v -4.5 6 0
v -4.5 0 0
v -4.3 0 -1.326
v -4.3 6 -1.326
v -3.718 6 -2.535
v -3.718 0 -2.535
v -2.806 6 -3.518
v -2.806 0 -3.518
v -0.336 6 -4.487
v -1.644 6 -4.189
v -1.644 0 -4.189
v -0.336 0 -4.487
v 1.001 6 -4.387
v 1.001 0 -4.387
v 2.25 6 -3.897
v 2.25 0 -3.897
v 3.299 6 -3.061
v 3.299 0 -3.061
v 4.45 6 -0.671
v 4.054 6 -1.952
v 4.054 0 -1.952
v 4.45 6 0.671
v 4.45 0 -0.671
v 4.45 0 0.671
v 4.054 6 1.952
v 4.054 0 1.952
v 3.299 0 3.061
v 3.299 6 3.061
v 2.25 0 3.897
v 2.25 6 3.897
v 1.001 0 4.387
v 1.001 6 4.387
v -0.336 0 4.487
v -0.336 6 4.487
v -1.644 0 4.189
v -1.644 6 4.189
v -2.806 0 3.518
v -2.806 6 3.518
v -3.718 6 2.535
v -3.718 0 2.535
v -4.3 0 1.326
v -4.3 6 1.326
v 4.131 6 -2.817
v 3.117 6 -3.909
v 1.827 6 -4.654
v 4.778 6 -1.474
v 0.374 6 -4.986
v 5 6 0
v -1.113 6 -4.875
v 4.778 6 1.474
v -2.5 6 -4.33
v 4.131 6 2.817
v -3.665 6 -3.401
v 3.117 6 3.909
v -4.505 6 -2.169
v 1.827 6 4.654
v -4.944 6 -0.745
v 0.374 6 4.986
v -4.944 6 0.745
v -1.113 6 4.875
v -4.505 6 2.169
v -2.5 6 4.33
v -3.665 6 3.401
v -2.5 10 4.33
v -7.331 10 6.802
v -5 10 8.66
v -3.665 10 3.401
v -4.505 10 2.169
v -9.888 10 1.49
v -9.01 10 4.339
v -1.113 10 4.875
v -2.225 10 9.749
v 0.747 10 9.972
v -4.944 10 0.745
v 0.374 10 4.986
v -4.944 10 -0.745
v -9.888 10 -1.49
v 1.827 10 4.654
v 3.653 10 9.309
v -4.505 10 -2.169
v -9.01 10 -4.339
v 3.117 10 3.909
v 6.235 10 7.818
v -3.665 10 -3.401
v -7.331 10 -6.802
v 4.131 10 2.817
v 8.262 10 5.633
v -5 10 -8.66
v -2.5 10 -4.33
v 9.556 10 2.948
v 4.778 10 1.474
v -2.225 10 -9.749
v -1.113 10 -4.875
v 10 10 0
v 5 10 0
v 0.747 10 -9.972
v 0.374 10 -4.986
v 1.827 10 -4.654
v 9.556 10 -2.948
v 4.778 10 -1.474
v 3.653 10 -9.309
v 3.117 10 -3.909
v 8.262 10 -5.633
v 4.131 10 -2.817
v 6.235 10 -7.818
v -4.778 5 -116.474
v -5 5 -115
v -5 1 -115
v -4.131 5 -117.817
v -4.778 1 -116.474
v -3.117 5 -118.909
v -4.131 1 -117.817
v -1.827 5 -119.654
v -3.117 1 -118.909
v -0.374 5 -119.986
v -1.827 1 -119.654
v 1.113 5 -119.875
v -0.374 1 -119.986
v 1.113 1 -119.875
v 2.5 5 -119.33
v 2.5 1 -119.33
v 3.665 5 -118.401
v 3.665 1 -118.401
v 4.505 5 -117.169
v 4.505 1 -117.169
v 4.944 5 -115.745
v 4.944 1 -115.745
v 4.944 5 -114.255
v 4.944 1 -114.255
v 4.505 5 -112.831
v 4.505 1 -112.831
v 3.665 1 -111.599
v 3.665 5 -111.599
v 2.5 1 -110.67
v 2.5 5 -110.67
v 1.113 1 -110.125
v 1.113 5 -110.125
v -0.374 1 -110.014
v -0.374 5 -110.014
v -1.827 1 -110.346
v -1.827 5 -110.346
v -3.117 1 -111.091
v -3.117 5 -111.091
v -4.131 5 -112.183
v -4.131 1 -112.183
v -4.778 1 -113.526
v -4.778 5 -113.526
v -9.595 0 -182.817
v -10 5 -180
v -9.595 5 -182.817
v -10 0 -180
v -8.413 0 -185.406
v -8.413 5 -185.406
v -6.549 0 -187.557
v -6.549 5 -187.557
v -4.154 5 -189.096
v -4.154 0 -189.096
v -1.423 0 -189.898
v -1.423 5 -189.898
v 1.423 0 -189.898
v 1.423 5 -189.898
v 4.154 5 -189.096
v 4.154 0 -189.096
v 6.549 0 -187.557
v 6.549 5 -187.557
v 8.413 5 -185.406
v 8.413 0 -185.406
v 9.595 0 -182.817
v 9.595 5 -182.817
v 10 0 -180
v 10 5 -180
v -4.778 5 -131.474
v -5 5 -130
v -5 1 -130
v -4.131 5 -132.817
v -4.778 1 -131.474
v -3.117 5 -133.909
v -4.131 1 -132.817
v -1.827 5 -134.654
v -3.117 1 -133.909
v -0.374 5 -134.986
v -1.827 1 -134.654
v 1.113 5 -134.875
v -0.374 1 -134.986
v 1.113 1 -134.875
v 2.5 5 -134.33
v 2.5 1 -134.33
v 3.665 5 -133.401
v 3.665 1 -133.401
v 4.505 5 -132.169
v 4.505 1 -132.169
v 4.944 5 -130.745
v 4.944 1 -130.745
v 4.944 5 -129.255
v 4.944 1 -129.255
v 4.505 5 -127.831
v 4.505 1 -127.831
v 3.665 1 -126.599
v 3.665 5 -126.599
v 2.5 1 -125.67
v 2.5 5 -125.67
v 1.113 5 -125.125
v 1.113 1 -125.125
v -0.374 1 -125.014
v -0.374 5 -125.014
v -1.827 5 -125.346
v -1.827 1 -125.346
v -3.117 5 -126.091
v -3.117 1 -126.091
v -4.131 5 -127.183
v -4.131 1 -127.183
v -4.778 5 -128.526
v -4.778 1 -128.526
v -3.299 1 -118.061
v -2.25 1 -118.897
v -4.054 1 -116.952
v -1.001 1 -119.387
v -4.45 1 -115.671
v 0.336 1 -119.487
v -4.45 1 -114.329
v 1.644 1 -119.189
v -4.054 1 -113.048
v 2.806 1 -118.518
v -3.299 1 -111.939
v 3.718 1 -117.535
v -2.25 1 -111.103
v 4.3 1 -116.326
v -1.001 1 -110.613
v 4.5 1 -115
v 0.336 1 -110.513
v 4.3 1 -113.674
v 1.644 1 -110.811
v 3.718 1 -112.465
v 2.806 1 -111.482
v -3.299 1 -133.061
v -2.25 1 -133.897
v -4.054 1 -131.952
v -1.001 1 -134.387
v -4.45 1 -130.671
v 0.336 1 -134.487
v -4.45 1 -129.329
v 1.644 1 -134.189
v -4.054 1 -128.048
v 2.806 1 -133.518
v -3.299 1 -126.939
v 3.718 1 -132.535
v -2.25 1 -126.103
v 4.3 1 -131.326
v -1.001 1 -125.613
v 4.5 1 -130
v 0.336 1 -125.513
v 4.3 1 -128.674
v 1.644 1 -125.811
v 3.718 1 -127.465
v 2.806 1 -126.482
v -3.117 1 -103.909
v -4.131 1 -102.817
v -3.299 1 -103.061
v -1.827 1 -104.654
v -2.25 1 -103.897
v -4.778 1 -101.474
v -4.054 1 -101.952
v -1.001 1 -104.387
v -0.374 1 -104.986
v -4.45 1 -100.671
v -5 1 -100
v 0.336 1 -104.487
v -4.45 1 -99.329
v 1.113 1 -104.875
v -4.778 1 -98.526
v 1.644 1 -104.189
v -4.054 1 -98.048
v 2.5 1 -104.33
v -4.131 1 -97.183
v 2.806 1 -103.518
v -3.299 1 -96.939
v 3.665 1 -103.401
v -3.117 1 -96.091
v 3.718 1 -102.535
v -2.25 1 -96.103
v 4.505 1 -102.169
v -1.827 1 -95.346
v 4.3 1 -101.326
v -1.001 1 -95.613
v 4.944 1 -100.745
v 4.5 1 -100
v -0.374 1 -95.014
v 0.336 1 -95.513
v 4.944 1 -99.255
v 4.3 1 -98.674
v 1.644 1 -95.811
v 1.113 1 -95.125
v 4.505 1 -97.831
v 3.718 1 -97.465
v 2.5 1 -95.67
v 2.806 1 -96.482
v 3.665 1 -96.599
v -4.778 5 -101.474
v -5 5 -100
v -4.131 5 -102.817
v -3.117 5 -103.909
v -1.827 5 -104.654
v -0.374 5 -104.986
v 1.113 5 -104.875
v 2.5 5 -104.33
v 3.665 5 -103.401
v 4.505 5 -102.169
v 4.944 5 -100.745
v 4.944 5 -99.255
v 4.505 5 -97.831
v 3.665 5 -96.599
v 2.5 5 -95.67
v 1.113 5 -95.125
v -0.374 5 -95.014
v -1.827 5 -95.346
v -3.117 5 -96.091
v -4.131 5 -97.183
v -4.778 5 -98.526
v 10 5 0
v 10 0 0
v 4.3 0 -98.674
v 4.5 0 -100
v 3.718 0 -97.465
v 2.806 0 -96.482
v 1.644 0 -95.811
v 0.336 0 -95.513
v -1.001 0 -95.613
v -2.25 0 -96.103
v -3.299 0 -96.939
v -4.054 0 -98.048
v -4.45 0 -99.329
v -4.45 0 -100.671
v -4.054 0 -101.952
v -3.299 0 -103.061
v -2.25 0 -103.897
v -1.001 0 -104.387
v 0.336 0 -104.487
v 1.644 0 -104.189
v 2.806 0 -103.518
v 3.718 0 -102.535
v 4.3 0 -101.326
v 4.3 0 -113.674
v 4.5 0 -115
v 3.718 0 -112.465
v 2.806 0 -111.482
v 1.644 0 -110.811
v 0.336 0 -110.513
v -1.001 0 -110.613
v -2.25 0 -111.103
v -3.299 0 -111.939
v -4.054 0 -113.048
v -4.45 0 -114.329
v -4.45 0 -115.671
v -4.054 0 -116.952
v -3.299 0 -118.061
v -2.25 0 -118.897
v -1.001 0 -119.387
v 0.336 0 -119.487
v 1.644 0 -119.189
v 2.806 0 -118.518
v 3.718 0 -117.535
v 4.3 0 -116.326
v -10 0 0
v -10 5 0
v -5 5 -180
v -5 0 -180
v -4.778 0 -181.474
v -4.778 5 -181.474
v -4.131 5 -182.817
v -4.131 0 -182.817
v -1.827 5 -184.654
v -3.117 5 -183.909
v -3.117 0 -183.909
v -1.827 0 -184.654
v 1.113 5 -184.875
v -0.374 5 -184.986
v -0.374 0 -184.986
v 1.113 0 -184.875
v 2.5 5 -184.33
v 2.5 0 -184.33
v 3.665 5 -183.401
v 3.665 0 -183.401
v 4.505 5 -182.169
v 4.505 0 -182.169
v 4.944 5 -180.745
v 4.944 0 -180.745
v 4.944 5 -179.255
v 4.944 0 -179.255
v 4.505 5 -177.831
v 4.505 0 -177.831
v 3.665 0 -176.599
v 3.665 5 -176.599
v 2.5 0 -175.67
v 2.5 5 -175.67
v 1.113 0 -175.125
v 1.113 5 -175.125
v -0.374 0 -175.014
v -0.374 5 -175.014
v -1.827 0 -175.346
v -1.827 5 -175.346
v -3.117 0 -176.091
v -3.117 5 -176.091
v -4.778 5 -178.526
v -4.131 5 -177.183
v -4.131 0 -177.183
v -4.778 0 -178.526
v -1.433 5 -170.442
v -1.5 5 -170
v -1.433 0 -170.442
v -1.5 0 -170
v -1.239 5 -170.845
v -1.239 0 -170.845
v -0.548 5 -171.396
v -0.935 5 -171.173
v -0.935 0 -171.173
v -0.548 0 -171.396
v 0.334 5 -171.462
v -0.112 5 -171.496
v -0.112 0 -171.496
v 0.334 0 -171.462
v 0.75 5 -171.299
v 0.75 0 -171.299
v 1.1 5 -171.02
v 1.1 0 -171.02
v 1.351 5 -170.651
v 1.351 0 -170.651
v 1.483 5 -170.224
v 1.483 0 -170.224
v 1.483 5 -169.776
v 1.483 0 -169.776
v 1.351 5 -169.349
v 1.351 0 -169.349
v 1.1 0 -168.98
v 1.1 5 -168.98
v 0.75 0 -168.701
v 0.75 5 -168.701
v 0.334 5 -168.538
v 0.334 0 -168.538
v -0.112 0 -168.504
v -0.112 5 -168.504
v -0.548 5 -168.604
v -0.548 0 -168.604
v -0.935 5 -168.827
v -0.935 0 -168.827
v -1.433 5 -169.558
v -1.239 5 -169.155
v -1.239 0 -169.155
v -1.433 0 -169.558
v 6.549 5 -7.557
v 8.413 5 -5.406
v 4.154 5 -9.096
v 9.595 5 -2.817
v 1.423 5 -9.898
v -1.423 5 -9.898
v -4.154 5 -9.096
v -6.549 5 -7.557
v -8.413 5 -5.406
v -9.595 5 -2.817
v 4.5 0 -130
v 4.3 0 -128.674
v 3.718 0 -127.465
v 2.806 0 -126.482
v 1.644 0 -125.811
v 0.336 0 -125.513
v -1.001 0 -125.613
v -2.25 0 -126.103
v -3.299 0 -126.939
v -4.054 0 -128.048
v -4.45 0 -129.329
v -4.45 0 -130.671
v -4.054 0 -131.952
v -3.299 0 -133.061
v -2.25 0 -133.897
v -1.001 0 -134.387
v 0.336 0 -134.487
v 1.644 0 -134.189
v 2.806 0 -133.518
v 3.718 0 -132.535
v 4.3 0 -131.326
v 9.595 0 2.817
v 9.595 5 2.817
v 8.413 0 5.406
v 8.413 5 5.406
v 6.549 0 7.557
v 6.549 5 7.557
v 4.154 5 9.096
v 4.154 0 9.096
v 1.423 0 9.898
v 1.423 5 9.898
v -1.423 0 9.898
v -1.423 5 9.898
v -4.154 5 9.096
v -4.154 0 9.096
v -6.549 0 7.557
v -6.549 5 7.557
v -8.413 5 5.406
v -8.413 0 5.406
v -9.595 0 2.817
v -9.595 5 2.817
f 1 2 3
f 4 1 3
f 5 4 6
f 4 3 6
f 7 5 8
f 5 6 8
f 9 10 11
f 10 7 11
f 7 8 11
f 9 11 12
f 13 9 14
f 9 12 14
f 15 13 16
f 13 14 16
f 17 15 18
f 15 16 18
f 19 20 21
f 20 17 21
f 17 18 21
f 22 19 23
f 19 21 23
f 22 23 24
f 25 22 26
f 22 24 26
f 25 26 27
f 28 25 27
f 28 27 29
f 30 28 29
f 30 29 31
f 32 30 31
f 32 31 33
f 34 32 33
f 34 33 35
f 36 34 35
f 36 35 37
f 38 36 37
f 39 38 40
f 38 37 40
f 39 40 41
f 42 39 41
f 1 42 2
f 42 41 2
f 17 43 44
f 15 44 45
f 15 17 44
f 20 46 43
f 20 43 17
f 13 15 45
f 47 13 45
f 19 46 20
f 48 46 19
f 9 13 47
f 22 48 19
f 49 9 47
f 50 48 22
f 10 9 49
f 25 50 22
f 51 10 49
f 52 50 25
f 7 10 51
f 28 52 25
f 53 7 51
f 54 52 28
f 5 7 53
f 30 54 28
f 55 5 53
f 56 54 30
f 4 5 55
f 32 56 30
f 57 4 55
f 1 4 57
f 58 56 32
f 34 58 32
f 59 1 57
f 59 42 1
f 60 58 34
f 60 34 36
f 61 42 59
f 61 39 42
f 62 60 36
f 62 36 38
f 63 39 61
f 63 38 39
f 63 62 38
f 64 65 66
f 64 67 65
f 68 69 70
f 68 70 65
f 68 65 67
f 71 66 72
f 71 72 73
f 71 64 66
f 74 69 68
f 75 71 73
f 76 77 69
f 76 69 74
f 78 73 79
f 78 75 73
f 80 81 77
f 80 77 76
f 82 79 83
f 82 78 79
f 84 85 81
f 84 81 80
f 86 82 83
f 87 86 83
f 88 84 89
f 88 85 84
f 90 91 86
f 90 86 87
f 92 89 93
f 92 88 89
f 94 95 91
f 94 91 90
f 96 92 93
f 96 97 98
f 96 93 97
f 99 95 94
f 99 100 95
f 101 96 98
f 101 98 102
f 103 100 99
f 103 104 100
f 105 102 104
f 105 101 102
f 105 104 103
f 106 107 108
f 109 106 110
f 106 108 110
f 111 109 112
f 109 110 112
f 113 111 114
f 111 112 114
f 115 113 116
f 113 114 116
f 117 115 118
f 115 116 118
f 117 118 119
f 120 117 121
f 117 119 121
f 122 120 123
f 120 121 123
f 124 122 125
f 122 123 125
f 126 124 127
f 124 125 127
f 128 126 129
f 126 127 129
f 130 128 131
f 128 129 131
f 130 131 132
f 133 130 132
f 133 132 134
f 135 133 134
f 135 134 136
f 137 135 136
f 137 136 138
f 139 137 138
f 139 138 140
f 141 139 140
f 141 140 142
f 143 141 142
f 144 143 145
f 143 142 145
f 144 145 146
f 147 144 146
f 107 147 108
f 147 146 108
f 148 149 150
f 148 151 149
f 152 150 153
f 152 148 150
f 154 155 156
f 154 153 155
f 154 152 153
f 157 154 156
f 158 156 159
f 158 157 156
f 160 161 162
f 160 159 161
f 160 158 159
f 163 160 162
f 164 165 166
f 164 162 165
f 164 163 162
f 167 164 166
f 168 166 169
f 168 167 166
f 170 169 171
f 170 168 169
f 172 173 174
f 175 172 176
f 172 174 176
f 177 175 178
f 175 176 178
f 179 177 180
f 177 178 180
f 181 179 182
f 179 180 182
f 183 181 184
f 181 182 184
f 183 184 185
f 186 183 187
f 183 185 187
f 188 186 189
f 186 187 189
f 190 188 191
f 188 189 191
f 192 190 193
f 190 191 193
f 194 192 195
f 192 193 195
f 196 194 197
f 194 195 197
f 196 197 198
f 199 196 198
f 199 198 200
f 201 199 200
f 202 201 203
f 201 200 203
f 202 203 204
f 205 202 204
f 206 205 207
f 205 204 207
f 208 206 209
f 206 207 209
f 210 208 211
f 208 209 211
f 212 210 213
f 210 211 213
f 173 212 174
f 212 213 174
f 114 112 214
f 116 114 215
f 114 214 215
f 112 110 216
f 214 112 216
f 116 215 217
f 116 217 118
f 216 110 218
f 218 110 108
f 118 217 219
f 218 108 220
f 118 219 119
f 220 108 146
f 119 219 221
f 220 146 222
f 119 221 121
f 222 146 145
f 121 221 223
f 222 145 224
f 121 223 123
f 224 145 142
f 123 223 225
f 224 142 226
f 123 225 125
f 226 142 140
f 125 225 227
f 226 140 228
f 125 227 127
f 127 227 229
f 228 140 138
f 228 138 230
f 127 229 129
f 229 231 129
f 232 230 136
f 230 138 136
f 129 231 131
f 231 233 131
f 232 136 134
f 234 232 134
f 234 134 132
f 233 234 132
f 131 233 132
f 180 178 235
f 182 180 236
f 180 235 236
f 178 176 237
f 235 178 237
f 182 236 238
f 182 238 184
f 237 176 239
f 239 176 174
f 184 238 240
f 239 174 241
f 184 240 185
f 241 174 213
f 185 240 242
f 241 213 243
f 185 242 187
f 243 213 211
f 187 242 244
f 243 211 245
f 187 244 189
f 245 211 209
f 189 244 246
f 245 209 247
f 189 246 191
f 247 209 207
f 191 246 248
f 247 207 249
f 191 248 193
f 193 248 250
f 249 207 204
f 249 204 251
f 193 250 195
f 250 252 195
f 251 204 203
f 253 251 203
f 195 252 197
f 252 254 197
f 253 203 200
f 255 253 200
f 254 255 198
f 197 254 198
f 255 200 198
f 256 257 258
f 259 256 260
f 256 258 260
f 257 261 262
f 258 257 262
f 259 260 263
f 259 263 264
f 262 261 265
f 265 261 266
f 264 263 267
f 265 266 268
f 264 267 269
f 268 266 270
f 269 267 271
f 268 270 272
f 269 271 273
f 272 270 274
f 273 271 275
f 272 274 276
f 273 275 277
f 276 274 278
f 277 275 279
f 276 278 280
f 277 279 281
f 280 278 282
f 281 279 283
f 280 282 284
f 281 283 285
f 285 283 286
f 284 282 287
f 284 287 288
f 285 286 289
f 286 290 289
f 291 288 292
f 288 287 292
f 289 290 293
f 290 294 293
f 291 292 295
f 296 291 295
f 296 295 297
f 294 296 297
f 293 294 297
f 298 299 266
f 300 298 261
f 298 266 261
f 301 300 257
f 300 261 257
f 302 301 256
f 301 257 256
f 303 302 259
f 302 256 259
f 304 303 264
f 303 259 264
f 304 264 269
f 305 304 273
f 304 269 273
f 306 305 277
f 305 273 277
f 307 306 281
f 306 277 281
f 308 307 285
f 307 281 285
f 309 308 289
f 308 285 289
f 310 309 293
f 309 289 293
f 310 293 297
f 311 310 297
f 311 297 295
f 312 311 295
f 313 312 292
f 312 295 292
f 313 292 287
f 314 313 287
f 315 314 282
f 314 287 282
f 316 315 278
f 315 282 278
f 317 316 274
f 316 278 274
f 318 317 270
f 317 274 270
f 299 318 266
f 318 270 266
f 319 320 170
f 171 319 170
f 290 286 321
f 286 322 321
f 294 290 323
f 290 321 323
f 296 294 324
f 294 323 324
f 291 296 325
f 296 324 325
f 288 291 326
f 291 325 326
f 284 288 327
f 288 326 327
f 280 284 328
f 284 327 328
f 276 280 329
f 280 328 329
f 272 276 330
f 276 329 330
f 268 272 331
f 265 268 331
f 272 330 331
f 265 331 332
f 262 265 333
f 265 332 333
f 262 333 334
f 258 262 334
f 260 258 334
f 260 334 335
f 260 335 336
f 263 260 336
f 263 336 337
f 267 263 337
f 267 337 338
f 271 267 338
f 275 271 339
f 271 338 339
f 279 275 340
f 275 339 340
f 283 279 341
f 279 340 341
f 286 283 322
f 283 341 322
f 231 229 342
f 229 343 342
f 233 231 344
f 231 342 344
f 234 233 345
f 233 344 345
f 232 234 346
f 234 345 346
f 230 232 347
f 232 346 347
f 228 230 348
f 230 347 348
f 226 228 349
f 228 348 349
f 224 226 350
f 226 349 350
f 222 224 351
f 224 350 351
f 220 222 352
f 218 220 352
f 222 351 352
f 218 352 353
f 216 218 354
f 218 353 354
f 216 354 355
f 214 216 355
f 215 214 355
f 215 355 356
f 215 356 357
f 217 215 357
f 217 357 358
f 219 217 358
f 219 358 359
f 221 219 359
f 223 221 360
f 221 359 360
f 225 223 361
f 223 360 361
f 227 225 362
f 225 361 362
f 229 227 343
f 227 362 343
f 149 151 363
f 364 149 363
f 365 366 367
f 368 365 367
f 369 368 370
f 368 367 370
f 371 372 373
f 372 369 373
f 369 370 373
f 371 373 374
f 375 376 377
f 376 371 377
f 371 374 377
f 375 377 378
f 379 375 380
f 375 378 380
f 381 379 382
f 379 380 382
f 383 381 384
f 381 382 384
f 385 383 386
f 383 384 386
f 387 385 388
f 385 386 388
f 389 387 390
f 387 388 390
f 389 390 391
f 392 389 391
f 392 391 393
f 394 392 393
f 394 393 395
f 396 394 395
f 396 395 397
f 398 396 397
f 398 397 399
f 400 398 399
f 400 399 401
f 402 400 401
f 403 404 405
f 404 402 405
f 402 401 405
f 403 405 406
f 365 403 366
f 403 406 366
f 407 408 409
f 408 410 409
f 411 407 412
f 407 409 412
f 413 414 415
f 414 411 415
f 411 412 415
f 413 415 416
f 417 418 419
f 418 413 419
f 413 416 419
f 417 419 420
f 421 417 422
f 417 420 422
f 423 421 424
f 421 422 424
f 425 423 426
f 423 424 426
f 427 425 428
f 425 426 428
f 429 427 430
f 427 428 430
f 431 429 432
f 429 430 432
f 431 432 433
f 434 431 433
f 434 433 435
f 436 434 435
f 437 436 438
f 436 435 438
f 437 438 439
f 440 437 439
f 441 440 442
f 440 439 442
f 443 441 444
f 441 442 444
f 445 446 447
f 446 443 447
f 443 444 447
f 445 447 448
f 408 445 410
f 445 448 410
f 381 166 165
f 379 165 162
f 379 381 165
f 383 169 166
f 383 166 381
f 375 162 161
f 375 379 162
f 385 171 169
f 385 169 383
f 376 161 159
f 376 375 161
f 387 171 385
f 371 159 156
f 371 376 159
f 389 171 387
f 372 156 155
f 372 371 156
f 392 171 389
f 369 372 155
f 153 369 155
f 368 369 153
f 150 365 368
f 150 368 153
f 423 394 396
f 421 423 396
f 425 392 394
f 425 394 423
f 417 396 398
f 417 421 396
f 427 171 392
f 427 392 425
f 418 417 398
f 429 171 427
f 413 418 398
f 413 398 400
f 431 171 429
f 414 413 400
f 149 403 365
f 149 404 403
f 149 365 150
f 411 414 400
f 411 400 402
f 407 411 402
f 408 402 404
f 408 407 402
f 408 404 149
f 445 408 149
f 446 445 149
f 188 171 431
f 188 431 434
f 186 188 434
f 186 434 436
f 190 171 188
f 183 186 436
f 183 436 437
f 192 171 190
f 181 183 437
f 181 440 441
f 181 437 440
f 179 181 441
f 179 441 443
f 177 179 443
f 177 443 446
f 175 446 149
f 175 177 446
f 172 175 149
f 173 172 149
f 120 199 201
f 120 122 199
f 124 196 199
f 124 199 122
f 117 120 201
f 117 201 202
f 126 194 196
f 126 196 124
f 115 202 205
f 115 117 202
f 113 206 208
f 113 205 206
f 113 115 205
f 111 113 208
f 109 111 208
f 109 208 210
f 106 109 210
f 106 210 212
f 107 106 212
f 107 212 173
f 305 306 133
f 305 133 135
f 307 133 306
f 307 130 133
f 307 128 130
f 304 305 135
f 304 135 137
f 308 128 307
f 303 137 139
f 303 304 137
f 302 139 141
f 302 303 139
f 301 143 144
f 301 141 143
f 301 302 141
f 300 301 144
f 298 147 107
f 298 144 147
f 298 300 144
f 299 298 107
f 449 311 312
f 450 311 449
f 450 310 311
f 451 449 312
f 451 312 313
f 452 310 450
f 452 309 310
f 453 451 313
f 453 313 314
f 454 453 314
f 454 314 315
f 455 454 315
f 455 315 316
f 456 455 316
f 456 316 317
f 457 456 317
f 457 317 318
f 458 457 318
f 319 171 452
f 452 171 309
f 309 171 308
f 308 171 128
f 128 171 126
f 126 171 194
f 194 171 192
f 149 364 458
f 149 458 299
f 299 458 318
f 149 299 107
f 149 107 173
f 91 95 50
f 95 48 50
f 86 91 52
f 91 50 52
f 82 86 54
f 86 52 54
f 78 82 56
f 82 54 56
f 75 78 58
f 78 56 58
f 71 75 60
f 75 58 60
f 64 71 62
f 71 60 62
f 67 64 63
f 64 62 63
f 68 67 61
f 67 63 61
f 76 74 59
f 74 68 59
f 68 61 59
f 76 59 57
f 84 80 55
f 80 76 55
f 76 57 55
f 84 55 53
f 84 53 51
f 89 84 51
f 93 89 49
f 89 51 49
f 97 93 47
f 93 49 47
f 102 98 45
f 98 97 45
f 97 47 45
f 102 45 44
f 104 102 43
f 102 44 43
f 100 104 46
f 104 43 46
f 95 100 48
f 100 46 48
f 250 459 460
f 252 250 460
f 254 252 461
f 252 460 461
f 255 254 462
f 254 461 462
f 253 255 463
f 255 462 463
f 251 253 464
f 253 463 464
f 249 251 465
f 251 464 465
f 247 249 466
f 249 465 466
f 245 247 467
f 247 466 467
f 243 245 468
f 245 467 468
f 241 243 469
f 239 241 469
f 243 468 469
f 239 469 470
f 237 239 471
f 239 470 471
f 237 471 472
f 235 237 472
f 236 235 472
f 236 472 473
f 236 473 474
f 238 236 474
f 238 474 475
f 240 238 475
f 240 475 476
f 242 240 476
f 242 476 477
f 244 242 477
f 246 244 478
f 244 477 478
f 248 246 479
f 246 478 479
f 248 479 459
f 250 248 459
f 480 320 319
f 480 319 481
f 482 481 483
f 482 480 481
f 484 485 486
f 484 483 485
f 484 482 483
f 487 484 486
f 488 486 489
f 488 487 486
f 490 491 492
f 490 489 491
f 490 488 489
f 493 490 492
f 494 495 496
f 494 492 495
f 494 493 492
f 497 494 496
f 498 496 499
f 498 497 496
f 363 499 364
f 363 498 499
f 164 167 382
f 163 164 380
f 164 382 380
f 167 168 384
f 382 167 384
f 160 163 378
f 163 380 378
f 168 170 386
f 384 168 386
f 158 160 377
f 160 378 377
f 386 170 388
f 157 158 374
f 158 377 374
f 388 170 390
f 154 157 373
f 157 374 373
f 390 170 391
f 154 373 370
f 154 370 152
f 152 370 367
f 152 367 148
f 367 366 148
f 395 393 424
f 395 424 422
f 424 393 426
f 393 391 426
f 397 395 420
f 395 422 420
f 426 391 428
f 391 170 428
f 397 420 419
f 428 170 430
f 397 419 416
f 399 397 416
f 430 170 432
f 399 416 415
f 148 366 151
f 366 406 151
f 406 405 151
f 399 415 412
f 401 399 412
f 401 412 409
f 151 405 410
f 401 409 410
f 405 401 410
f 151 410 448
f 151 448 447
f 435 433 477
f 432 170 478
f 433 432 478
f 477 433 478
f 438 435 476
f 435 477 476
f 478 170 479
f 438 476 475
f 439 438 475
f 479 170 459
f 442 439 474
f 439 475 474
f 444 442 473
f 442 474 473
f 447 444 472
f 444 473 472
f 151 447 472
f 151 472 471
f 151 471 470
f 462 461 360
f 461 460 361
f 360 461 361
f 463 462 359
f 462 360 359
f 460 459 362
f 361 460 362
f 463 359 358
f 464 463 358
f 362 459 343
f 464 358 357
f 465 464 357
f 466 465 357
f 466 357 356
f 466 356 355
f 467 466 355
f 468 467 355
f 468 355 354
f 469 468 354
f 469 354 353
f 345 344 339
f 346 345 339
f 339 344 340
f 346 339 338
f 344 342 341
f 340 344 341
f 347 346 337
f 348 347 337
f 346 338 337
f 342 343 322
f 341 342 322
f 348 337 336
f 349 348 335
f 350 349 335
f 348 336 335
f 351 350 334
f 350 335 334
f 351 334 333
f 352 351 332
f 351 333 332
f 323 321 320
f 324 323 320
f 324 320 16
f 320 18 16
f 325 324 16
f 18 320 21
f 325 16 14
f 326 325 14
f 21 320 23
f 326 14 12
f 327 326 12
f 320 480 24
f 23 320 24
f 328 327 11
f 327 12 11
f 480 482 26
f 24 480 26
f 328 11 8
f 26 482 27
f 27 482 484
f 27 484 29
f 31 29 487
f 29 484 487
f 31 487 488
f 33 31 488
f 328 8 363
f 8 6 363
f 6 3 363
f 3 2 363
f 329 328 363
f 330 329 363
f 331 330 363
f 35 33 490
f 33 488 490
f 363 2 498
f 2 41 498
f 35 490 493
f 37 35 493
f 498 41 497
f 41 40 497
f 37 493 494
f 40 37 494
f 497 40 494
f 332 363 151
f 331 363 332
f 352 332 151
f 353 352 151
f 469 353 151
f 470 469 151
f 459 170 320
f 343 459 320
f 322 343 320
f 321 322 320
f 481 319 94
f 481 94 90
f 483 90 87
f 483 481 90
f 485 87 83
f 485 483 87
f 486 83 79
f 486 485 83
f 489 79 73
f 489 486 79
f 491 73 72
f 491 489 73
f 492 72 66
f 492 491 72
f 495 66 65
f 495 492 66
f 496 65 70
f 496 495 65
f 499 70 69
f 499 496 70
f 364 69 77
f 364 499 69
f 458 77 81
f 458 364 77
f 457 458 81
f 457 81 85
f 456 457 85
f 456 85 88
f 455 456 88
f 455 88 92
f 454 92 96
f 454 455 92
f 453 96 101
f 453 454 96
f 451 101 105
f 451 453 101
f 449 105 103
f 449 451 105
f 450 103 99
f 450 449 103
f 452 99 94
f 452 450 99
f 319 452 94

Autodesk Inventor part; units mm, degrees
ref_plane "YZ Plane" through (0, 0, 0) normal (1, 0, 0) x (0, 1, 0)
ref_plane "XZ Plane" through (0, 0, 0) normal (0, 1, 0) x (-1, 0, 0)
ref_plane "XY Plane" through (0, 0, 0) normal (0, 0, 1) x (1, 0, 0)
sketch "Skizze3" plane through (0, 0, 0) normal (0, 1, 0) x (-1, 0, 0)
  line L0 (0, 0) -> (0, -180) construction
  line L1 (-10, 0) -> (-10, -180)
  line L2 (10, -180) -> (10, 0)
  arc A0 (10, 0) -> (-10, 0) centre (0, 0) ccw
  arc A1 (-10, -180) -> (10, -180) centre (0, -180) ccw
  circle A2 centre (0, 0) radius 5
  circle A3 centre (0, -180) radius 5
  circle A4 centre (0, -170) radius 1.5
  circle A5 centre (0, -130) radius 5
  circle A6 centre (0, -115) radius 5
  circle A7 centre (0, -100) radius 5
  circle A8 centre (0, 0) radius 4.5
  point P0 (0, -90)
  dimension "d4" = 180
  dimension "d5" = 10
  dimension "d6" = 10
  dimension "d7" = 10
  dimension "d8" = 3
  dimension "d9" = 10
  dimension "d10" = 50
  dimension "d11" = 10
  dimension "d12" = 10
  dimension "d13" = 10
  dimension "d14" = 15
  dimension "d15" = 15
  dimension "d27" = 9
extrude "Extrusion3" add sketch "Skizze3" along normal blind 5 contours A0 L2 A1 L1
sketch "Skizze4" plane through (0, 5, 0) normal (0, 1, 0) x (1, 0, 0)
  circle A0 centre (0, 0) radius 5 projected
  circle A1 centre (0, 0) radius 10
  dimension "d18" = 20
extrude "Extrusion4" add sketch "Skizze4" along normal blind 5
extrude "Extrusion5" add sketch "Skizze3" along normal blind 6 contours A2
sketch "Skizze5" plane through (0, 0, 0) normal (0, -1, 0) x (1, 0, 0)
  circle A0 centre (0, -130) radius 5 projected
  circle A1 centre (0, -100) radius 5 projected
  circle A2 centre (0, -115) radius 5 projected
  circle A3 centre (0, -100) radius 4.5
  circle A4 centre (0, -115) radius 4.5
  circle A5 centre (0, -130) radius 4.5
  point P0 (0, 0)
  dimension "d28" = 9
  dimension "d29" = 9
  dimension "d30" = 9
extrude "Extrusion7" add sketch "Skizze5" against normal blind 1
properties part number "BT303_trajan20_21" material "Kunststoff, undurchsichtig Schwarz"
